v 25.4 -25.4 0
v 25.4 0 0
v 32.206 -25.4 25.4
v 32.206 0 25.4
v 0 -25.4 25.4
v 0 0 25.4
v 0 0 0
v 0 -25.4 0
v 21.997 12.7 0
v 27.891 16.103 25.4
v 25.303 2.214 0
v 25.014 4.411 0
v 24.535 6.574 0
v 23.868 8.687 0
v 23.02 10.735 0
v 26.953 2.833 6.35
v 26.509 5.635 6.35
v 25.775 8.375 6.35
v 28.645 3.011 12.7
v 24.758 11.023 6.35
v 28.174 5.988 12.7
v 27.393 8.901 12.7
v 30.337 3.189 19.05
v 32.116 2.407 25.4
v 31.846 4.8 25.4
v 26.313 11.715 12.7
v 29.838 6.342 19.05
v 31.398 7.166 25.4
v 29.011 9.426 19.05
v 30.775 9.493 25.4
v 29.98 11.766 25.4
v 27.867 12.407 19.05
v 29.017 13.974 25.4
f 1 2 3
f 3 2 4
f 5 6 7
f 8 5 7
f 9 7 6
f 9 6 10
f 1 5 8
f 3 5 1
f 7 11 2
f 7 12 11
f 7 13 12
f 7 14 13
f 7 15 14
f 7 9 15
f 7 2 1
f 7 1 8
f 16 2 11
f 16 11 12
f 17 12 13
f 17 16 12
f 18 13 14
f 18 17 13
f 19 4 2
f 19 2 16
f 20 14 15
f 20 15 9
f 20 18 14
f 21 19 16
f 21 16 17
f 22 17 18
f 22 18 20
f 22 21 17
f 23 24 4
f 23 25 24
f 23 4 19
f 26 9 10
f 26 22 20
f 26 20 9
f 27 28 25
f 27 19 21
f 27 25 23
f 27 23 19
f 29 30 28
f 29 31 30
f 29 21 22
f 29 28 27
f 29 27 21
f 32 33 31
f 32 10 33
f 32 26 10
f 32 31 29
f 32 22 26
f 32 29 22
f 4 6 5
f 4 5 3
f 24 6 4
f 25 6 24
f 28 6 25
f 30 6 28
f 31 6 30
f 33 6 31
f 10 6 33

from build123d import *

# Parameters (mm, degrees)
F1_DEPTH = 25.4
F2_ANGLE = 30


with BuildPart() as f1:
    # F0 (on Front) → F1 (new body)
    with BuildSketch(Plane.XZ):
        Polygon((0, 25.4), (0, 0), (25.4, 0), (32.205909, 25.4), align=None)
    extrude(amount=F1_DEPTH)

    # F0 (on Front) → F2 (revolve)
    with BuildSketch(Plane.XZ):
        Polygon((0, 25.4), (0, 0), (25.4, 0), (32.205909, 25.4), align=None)
    revolve(axis=Axis((0, 0, 12.7), (0, 0, 1)), revolution_arc=F2_ANGLE)


solid = f1.part
